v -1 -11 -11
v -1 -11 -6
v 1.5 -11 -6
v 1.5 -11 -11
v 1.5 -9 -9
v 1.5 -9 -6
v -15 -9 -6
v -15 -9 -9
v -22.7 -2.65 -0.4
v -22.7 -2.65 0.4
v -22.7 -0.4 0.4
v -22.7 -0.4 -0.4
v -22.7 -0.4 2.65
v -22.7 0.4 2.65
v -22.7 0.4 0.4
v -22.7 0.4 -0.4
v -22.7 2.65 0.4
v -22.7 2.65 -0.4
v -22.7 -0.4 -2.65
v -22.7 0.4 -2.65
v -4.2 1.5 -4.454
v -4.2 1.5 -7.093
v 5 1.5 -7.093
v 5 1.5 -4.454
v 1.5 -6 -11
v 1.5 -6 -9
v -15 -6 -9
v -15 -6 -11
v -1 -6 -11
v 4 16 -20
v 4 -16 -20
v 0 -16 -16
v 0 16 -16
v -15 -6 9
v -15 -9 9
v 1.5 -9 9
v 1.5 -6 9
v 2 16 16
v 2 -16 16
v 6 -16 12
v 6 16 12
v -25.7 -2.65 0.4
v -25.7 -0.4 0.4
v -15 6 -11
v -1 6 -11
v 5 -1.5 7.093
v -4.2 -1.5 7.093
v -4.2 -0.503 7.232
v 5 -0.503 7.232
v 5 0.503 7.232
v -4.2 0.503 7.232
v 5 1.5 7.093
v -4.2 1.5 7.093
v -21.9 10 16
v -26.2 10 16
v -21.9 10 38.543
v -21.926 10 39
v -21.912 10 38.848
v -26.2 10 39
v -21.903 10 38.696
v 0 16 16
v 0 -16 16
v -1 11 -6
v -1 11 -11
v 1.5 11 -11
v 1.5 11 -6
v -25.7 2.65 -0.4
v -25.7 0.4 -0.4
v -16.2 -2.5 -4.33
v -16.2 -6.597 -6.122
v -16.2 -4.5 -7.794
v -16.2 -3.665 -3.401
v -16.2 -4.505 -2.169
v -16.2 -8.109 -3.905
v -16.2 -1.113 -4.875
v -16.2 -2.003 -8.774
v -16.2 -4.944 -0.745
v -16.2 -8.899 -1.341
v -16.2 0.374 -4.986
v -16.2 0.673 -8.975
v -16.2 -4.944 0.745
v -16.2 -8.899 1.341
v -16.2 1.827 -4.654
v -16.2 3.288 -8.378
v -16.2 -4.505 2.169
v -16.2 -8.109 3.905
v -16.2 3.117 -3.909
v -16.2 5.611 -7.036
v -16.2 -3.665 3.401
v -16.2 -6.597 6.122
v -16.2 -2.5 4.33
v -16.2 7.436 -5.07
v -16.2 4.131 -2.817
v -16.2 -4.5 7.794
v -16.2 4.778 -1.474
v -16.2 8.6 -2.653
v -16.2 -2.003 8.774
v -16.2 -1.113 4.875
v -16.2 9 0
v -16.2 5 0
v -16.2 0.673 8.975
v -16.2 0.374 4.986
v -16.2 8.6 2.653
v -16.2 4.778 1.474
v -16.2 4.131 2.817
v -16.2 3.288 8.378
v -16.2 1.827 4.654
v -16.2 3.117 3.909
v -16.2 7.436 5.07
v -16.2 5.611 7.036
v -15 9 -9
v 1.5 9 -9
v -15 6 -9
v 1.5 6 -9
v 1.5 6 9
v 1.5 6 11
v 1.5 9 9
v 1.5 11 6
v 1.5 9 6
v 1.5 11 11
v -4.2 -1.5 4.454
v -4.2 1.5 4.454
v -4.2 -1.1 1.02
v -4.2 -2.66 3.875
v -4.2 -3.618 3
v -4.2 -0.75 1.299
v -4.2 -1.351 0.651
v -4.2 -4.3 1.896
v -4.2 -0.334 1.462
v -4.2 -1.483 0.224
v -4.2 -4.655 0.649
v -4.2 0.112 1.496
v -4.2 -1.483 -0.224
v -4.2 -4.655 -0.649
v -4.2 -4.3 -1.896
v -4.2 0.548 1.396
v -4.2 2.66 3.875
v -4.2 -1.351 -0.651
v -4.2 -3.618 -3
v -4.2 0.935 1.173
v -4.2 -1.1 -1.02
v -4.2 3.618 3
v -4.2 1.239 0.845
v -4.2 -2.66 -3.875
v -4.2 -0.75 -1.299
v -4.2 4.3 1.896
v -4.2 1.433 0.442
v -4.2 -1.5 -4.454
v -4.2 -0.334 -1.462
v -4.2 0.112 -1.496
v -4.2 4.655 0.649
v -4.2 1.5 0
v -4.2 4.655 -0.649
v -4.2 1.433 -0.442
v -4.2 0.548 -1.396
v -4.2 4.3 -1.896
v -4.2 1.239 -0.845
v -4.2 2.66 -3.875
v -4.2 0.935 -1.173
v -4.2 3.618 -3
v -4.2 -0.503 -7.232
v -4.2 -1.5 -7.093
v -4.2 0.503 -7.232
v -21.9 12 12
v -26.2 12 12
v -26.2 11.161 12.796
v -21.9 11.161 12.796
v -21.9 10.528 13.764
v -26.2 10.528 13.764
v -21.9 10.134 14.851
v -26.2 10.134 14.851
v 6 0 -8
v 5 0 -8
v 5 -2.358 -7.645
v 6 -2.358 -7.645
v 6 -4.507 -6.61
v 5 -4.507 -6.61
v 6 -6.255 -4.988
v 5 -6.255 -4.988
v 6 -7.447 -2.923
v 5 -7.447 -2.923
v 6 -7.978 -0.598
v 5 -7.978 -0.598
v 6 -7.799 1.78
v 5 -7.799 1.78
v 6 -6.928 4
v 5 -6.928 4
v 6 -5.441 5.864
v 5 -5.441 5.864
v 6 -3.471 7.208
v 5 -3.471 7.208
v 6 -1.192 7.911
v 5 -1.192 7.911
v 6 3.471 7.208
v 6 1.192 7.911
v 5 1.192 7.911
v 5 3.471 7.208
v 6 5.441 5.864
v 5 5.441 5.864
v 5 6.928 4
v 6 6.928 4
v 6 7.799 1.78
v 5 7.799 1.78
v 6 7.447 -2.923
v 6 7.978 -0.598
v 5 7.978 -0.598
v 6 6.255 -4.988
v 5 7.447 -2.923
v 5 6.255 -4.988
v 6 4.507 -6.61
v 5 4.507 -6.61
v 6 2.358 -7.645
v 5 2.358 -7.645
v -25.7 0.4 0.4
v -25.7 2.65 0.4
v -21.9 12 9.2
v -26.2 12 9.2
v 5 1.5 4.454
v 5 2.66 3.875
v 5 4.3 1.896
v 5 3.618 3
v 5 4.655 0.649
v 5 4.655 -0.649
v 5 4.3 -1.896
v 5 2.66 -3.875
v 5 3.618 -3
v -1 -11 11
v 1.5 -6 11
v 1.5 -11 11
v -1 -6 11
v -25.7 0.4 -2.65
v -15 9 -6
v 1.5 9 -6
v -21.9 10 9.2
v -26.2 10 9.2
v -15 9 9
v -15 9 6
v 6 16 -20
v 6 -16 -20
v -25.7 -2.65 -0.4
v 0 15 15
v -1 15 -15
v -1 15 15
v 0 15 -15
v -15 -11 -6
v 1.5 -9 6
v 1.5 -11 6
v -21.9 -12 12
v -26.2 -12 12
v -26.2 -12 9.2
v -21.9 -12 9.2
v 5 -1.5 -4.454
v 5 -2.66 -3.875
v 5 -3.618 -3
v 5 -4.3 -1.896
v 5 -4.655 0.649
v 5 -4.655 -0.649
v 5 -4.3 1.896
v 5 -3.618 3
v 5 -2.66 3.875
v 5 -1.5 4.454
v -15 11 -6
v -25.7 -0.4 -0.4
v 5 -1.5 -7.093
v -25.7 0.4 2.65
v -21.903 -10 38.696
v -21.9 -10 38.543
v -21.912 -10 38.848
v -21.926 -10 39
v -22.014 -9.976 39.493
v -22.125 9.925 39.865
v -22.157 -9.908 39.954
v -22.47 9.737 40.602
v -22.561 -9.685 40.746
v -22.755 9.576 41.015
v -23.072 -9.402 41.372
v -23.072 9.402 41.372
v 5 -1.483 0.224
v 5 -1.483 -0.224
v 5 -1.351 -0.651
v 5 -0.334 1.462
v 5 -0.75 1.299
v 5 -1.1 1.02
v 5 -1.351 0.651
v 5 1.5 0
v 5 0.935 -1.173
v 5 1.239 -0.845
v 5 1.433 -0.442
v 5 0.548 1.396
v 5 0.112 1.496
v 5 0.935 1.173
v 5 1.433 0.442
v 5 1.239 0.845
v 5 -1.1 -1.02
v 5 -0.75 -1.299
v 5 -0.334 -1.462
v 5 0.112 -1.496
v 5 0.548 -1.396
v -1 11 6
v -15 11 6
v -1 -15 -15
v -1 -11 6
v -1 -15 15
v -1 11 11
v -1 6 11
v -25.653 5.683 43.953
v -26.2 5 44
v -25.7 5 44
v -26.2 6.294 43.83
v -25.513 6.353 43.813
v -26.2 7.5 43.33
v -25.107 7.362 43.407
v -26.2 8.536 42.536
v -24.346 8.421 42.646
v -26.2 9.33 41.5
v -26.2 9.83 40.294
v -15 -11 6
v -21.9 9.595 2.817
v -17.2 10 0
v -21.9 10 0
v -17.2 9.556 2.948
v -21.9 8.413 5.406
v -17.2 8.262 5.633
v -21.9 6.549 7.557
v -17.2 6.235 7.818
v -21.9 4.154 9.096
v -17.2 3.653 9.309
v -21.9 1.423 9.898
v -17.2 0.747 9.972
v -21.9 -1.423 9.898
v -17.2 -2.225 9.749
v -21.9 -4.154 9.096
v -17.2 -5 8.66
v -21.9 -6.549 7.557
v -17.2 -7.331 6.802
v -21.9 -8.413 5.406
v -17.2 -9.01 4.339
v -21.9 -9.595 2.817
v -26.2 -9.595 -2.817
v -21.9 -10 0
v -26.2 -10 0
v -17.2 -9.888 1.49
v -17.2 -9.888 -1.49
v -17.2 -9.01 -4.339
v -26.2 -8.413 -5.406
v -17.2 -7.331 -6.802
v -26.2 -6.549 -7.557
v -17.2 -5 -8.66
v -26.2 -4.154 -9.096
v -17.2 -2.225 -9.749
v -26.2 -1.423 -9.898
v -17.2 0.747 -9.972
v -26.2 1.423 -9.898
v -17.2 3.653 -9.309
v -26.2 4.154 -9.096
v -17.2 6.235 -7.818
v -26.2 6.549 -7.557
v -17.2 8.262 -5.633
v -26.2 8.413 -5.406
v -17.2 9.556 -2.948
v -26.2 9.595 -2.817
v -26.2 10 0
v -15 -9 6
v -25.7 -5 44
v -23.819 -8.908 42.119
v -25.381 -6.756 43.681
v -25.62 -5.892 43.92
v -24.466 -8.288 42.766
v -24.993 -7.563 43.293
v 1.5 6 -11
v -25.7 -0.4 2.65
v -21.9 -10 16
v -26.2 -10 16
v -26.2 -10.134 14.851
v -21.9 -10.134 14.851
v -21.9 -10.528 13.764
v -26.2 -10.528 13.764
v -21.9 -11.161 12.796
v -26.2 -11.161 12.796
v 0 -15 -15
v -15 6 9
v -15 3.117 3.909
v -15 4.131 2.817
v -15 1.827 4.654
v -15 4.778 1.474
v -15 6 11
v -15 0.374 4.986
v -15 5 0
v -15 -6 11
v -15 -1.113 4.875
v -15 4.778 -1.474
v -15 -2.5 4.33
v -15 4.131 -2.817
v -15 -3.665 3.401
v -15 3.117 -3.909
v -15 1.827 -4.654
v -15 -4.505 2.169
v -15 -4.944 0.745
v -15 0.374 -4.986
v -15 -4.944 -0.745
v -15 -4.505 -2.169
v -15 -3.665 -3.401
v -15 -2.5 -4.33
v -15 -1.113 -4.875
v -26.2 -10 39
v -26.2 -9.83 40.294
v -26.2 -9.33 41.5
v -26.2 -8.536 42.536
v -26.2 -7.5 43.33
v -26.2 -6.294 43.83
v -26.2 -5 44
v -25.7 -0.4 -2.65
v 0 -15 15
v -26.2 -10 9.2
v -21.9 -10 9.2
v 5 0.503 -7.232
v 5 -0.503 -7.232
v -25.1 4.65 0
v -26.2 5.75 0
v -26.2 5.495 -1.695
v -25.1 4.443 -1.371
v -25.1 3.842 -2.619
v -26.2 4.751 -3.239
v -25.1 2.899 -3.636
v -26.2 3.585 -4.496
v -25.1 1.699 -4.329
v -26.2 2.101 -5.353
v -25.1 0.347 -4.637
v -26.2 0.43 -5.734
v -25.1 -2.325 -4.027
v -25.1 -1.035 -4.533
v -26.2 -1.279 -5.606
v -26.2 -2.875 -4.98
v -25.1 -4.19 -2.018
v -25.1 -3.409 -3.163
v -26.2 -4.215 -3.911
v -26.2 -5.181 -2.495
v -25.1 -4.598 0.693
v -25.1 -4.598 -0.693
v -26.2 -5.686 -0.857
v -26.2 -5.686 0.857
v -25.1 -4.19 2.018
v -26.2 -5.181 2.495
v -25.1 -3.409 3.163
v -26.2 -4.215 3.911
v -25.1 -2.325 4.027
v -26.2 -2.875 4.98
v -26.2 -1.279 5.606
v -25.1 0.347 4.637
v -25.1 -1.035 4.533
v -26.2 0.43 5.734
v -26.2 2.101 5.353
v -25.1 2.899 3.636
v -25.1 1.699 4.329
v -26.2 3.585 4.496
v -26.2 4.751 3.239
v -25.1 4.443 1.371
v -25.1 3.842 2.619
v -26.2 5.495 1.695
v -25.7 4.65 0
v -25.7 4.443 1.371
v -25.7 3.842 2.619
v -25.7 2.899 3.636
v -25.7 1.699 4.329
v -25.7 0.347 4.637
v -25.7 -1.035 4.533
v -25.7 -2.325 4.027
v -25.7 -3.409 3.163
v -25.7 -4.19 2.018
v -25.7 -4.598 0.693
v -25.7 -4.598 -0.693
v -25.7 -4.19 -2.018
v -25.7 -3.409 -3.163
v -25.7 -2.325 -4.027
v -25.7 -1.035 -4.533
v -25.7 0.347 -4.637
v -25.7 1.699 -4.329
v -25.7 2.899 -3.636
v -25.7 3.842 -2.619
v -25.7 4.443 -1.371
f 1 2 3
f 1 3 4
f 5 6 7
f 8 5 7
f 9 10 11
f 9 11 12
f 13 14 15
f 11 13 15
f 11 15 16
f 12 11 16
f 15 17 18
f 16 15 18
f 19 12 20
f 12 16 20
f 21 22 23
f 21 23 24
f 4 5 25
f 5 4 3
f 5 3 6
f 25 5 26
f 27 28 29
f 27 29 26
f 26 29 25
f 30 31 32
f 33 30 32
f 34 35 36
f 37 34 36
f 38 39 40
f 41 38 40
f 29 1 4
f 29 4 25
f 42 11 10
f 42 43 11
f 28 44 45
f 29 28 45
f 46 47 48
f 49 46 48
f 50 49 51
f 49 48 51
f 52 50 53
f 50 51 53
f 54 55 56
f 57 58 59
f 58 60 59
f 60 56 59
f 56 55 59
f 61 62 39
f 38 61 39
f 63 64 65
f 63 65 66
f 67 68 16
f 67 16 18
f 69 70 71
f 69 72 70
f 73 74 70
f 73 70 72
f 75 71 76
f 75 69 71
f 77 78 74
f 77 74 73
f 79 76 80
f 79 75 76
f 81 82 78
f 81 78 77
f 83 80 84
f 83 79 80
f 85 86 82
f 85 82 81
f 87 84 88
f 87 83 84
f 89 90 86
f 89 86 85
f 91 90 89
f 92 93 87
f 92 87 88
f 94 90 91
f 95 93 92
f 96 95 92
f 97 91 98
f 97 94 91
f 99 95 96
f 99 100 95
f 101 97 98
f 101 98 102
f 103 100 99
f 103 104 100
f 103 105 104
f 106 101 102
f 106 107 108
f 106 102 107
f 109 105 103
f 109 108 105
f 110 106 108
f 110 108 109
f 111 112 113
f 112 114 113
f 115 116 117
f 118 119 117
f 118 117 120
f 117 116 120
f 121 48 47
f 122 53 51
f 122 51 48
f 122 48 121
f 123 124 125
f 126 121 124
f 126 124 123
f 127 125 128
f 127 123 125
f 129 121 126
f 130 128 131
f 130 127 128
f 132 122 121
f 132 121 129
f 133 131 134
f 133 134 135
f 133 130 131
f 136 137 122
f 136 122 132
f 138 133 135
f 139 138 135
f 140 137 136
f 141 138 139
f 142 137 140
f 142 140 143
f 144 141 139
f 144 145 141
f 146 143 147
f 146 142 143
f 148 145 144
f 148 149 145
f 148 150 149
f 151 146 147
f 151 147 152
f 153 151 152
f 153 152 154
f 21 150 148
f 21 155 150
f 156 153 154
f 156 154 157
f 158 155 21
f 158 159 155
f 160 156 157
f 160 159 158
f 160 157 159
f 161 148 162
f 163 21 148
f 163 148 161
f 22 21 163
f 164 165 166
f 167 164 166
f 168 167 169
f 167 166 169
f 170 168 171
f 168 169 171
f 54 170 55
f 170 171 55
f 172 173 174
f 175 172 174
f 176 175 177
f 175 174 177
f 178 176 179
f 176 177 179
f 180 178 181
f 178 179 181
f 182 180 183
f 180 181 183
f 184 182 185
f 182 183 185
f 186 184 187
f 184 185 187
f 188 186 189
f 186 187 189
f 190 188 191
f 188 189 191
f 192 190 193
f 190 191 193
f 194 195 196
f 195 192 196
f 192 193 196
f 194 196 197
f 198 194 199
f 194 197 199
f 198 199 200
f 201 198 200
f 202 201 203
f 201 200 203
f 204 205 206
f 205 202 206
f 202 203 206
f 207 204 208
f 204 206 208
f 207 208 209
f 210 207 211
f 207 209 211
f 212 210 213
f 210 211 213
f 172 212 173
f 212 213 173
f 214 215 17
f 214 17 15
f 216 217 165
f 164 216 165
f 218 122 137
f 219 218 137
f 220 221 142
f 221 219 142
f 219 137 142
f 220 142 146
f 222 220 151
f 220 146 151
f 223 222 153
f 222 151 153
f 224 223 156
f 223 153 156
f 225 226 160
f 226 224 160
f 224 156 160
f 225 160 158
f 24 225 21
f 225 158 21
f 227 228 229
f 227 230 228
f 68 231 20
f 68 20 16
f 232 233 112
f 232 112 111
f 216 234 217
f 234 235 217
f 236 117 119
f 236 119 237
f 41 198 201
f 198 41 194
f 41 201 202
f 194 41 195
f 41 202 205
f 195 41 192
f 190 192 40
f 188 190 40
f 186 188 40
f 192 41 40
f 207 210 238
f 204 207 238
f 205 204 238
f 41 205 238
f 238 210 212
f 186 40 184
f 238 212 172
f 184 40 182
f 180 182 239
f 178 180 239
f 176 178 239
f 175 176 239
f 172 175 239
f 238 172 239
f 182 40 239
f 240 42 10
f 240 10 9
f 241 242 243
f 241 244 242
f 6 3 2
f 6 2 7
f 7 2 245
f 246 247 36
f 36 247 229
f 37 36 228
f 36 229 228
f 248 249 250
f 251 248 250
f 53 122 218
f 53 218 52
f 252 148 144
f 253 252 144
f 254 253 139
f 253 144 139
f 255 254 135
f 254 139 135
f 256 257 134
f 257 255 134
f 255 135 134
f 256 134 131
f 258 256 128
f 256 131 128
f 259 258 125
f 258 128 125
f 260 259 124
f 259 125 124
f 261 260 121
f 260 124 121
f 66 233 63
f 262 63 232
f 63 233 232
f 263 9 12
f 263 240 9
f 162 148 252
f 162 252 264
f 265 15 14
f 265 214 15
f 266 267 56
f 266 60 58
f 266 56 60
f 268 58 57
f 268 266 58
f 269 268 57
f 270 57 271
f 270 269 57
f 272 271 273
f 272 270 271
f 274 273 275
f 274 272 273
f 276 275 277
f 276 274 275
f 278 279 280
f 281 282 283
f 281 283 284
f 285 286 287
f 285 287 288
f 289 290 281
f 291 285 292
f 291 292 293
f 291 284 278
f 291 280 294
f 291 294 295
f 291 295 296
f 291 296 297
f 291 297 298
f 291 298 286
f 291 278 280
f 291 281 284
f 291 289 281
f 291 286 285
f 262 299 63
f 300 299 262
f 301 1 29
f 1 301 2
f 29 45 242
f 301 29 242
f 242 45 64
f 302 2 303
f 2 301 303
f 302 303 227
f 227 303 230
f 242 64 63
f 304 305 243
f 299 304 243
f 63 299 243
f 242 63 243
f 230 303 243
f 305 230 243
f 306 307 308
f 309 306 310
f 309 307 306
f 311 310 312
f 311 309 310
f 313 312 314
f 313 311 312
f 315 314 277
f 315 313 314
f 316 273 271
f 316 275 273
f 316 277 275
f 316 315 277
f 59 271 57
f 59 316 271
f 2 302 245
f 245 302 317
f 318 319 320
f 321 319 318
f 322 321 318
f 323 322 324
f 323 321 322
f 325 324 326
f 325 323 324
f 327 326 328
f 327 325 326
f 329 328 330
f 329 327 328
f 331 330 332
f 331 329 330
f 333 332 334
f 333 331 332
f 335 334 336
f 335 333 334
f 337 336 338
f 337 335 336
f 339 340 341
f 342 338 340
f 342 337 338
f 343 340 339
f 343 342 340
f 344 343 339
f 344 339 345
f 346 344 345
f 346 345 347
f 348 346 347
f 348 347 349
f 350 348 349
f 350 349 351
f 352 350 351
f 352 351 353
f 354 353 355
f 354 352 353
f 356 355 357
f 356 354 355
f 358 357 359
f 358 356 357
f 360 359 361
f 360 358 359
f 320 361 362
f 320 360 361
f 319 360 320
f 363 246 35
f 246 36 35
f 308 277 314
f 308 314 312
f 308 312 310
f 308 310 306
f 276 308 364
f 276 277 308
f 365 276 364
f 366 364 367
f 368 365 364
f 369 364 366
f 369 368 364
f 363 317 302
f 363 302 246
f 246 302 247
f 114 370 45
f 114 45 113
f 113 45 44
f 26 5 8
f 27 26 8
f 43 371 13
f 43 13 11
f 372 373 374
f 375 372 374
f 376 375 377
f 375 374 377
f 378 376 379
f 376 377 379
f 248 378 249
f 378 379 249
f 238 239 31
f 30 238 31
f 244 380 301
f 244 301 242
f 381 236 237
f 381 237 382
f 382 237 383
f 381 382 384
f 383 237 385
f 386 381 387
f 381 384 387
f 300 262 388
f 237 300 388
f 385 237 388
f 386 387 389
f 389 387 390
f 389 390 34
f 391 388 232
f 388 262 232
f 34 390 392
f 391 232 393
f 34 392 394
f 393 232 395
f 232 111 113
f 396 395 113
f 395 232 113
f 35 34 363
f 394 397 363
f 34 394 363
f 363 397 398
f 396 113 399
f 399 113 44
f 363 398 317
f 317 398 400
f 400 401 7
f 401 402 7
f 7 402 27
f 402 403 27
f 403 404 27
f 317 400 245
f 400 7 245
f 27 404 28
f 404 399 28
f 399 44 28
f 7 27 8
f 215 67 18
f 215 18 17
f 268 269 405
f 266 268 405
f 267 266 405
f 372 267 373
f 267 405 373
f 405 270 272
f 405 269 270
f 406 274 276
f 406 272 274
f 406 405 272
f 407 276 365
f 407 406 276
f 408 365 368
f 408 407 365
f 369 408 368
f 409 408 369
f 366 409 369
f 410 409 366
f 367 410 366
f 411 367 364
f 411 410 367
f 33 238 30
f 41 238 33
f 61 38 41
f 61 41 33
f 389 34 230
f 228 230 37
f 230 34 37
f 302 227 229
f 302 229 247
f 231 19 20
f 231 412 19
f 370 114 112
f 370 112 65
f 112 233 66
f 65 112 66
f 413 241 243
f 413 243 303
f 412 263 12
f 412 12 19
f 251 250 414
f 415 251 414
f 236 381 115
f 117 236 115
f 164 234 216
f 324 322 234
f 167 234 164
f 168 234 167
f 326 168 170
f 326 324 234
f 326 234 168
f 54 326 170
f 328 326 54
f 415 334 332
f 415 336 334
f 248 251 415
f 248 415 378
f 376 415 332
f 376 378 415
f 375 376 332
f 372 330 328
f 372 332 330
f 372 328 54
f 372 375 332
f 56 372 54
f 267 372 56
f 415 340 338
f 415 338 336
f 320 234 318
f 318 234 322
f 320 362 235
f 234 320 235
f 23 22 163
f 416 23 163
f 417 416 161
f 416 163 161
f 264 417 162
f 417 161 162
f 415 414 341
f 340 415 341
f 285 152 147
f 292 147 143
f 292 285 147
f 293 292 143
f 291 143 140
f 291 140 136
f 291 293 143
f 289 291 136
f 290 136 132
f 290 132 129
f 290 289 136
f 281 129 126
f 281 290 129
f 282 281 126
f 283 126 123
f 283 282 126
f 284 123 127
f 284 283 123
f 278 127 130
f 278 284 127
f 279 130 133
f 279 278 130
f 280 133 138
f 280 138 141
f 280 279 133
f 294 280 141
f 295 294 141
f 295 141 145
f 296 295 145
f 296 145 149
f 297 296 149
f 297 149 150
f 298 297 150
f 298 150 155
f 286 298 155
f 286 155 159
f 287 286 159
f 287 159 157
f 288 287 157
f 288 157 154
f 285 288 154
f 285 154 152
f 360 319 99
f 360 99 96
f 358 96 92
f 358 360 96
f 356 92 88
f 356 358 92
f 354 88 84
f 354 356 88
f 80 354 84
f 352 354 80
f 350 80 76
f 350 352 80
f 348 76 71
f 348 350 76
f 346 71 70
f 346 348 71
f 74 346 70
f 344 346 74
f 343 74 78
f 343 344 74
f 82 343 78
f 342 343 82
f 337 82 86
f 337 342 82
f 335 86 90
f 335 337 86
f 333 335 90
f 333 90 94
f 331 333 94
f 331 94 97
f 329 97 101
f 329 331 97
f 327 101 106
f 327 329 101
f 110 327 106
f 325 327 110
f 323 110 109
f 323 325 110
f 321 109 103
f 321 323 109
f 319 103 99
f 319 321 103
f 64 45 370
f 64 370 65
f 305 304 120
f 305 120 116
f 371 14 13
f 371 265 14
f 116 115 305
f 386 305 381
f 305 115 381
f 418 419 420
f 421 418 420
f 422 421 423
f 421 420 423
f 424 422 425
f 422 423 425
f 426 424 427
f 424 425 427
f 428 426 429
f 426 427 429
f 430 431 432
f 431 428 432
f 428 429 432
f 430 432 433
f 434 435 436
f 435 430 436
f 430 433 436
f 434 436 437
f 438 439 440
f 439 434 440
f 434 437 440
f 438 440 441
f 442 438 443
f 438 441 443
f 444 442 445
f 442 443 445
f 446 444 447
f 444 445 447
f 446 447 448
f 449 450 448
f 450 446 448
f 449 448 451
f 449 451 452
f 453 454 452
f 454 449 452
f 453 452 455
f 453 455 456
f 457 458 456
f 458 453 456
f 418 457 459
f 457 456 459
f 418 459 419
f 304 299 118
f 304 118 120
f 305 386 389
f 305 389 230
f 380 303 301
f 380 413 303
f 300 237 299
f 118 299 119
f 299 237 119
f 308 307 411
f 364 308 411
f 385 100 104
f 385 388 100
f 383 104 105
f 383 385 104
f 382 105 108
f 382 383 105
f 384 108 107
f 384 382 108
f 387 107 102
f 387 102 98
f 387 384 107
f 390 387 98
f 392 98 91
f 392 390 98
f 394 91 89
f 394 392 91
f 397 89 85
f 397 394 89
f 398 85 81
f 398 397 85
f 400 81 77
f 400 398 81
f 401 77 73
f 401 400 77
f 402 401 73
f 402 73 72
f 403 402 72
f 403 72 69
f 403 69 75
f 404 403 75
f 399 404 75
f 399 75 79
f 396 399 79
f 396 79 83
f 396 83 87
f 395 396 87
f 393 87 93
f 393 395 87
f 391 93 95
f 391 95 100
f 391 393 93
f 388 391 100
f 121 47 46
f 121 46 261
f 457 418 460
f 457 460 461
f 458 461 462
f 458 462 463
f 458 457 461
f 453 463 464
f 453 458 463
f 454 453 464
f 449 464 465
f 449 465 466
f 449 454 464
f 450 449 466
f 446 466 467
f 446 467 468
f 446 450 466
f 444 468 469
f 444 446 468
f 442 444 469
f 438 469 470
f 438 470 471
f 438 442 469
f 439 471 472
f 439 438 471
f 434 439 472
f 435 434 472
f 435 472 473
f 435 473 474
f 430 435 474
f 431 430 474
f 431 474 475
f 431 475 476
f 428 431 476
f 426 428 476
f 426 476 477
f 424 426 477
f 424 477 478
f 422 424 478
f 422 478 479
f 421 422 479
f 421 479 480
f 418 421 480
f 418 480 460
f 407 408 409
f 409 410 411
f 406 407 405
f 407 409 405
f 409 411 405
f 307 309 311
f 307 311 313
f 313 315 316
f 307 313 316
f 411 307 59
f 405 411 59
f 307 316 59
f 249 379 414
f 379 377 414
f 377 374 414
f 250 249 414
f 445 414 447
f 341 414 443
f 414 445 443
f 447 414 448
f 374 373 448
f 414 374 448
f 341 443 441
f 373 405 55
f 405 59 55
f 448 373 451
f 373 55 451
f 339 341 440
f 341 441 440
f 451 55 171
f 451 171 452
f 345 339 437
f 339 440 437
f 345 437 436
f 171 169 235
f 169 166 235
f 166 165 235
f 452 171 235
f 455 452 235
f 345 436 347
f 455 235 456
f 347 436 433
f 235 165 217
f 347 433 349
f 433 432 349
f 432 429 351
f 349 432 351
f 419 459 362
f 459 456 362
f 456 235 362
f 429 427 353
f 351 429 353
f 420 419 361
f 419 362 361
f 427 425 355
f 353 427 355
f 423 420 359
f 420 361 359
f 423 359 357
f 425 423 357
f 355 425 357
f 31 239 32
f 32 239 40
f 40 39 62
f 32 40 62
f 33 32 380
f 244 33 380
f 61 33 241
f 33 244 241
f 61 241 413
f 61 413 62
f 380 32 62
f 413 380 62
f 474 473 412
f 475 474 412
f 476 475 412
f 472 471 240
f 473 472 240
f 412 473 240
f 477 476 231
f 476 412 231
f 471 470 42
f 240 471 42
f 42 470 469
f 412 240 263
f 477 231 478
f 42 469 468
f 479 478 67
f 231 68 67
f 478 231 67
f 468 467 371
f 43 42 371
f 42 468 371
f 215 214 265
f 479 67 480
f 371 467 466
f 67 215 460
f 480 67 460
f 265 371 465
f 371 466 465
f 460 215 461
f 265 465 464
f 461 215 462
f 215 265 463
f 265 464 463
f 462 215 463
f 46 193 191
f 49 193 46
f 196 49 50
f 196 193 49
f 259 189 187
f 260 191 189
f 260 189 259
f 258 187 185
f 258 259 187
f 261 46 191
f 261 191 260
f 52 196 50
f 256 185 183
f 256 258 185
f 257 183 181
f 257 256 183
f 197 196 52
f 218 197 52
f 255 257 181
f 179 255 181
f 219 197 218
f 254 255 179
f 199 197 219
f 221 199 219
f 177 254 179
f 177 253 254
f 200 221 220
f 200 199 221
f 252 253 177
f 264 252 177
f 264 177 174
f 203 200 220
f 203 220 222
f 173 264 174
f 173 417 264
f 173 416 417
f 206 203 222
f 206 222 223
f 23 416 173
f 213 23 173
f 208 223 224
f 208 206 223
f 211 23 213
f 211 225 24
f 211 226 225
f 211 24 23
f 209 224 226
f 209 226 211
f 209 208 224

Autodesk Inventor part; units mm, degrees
sketch "Sketch_1" plane through (0, 0, 0) normal (0, 1, 0) x (-1, 0, 0)
  line L0 (0, 16) -> (-2, 16)
  line L1 (-2, 16) -> (-6, 12)
  line L2 (-6, 12) -> (-6, -20)
  line L3 (-6, -20) -> (-4, -20)
  line L4 (-4, -20) -> (0, -16)
  line L5 (0, -16) -> (0, 16)
extrude "Extrusion1" add sketch "Sketch_1" along normal mid plane 32
sketch "Sketch_2" plane through (0, 0, 0) normal (1, 0, 0) x (0, 1, 0)
  line L0 (15, 15) -> (-15, 15)
  line L1 (-15, 15) -> (-15, -15)
  line L2 (-15, -15) -> (15, -15)
  line L3 (15, -15) -> (15, 15)
extrude "Extrusion2" add sketch "Sketch_2" against normal blind 1
sketch "Sketch_3" plane through (0, 0, 0) normal (1, 0, 0) x (0, 1, 0)
  line L0 (11, 11) -> (-11, 11)
  line L1 (-11, 11) -> (-11, -11)
  line L2 (-11, -11) -> (11, -11)
  line L3 (11, -11) -> (11, 11)
extrude "Extrusion3" cut sketch "Sketch_3" along normal mid plane 3
sketch "Sketch_5" plane through (0, 0, 0) normal (0, 1, 0) x (-1, 0, 0)
  line L0 (15, -9) -> (15, 9)
  line L1 (15, 9) -> (-1.5, 9)
  line L2 (-1.5, 9) -> (-1.5, -9)
  line L3 (-1.5, -9) -> (15, -9)
extrude "Extrusion4" add sketch "Sketch_5" along normal mid plane 18
sketch "Sketch_4" plane through (0, 0, 0) normal (0, 1, 0) x (-1, 0, 0)
  line L0 (15, -6) -> (15, 6)
  line L1 (15, 6) -> (-1.5, 6)
  line L2 (-1.5, 6) -> (-1.5, -6)
  line L3 (-1.5, -6) -> (15, -6)
extrude "Extrusion5" add sketch "Sketch_4" along normal mid plane 22
sketch "Sketch_7" plane through (0, 0, 0) normal (0, 0, 1) x (1, 0, 0)
  line L0 (-15, 6) -> (-15, -6)
  line L1 (-15, -6) -> (1.5, -6)
  line L2 (1.5, -6) -> (1.5, 6)
  line L3 (1.5, 6) -> (-15, 6)
extrude "Extrusion6" add sketch "Sketch_7" along normal mid plane 22
sketch "Sketch_10" plane through (0, 0, 0) normal (0, 0, 1) x (1, 0, 0)
  line L0 (-15, 0) -> (-20.45, 0)
  line L1 (-20.45, 0) -> (-26.2, 5.75)
  line L2 (-26.2, 5.75) -> (-26.2, 10)
  line L3 (-26.2, 10) -> (-17.2, 10)
  line L4 (-17.2, 10) -> (-16.2, 9)
  line L5 (-16.2, 9) -> (-16.2, 5)
  line L6 (-16.2, 5) -> (-15, 5)
  line L7 (-15, 5) -> (-15, 0)
  line L8 (-15, 0) -> (-20.45, 0)
revolve "Revolution1" add sketch "Sketch_10" angle 360 about axis through (-15, 0, 0) along (1, 0, 0)
sketch "Sketch_11" plane through (0, 0, 0) normal (0, 0, 1) x (1, 0, 0)
  line L0 (-20.4, 0) -> (-26.2, 0)
  line L1 (-25.7, 0) -> (-25.7, 4.65)
  line L2 (-25.7, 4.65) -> (-25.05, 4.65)
  line L3 (-25.05, 4.65) -> (-20.4, 0)
  line L4 (-20.4, 0) -> (-25.7, 0)
revolve "Revolution2" add sketch "Sketch_11" angle 360 about axis through (-20.4, 0, 0) along (1, 0, 0)
sketch "Sketch_12" plane through (-25.7, 0, 0) normal (1, 0, 0) x (0, 0, -1)
  line L0 (-2.65, 0.4) -> (-2.65, -0.4)
  line L1 (-2.65, -0.4) -> (-0.4, -0.4)
  line L2 (-0.4, -0.4) -> (-0.4, -2.65)
  line L3 (-0.4, -2.65) -> (0.4, -2.65)
  line L4 (0.4, -2.65) -> (0.4, -0.4)
  line L5 (0.4, -0.4) -> (2.65, -0.4)
  line L6 (2.65, -0.4) -> (2.65, 0.4)
  line L7 (2.65, 0.4) -> (0.4, 0.4)
  line L8 (0.4, 0.4) -> (0.4, 2.65)
  line L9 (0.4, 2.65) -> (-0.4, 2.65)
  line L10 (-0.4, 2.65) -> (-0.4, 0.4)
  line L11 (-0.4, 0.4) -> (-2.65, 0.4)
extrude "Extrusion7" cut sketch "Sketch_12" along normal blind 3
sketch "Sketch_13" plane through (-26.2, 0, 0) normal (1, 0, 0) x (0, 0, -1)
  arc A0 (-44, -5) -> (-39, -10) centre (-39, -5) ccw
  line L0 (-39, -10) -> (-16, -10)
  arc A1 (-12, -12) -> (-16, -10) centre (-16, -15) ccw
  line L1 (-12, -12) -> (-9.2, -12)
  line L2 (-9.2, -12) -> (-9.2, -10)
  line L3 (-9.2, -10) -> (0, -10)
  line L4 (0, -10) -> (0, -6)
  arc A2 (0, 6) -> (0, -6) centre (0, 0) ccw
  line L5 (0, 6) -> (0, 10)
  line L6 (0, 10) -> (-9.2, 10)
  line L7 (-9.2, 10) -> (-9.2, 12)
  line L8 (-9.2, 12) -> (-12, 12)
  arc A3 (-16, 10) -> (-12, 12) centre (-16, 15) ccw
  line L9 (-16, 10) -> (-39, 10)
  arc A4 (-39, 10) -> (-44, 5) centre (-39, 5) ccw
  line L10 (-44, 5) -> (-44, -5)
extrude "Extrusion8" add sketch "Sketch_13" along normal blind 4.3
sketch "Sketch_14" plane through (0, 0, 0) normal (0, 1, 0) x (-1, 0, 0)
  line L0 (28, 34) -> (28, 49)
  line L1 (28, 49) -> (18, 49)
  line L2 (18, 49) -> (18, 34)
  line L3 (18, 34) -> (21.9, 34)
  line L4 (21.9, 34) -> (21.9, 38.5431)
  arc A0 (23.0716, 41.3716) -> (21.9, 38.5431) centre (25.9, 38.5431) ccw
  line L5 (23.0716, 41.3716) -> (25.7, 44)
  line L6 (25.7, 44) -> (26.2, 44)
  line L7 (26.2, 44) -> (26.2, 34)
  line L8 (26.2, 34) -> (28, 34)
extrude "Extrusion9" cut sketch "Sketch_14" along normal mid plane 20
sketch "Sketch_15" plane through (-4.2, 0, 0) normal (1, 0, 0) x (0, 0, -1)
  circle A0 centre (0, 0) radius 8
extrude "Extrusion10" cut sketch "Sketch_15" along normal blind 10.2
sketch "Sketch_16" plane through (-4.2, 0, 0) normal (1, 0, 0) x (0, 0, -1)
  circle A0 centre (0, 0) radius 8
  arc A1 (-7.0931, 1.5) -> (-7.0931, -1.5) centre (0, 0) ccw
  line L0 (-7.0931, -1.5) -> (-4.4542, -1.5)
  arc A2 (-4.4542, -1.5) -> (4.4542, -1.5) centre (0, 0) ccw
  line L1 (4.4542, -1.5) -> (7.0931, -1.5)
  arc A3 (7.0931, -1.5) -> (7.0931, 1.5) centre (0, 0) ccw
  line L2 (7.0931, 1.5) -> (4.4542, 1.5)
  arc A4 (4.4542, 1.5) -> (-4.4542, 1.5) centre (0, 0) ccw
  line L3 (-4.4542, 1.5) -> (-7.0931, 1.5)
extrude "Extrusion11" add sketch "Sketch_16" along normal blind 9.2
sketch "Sketch_17" plane through (0, 0, 0) normal (1, 0, 0) x (0, 1, 0)
  circle A0 centre (0, 0) radius 1.5
extrude "Extrusion12" add sketch "Sketch_17" along normal mid plane 10
ref_plane "verschluss_XY" through (-1, 0, 0) normal (1, 0, 0) x (0, 0, -1)
ref_plane "verschluss_YZ" through (-1, 0, 0) normal (0, 0, -1) x (0, 1, 0)
ref_plane "verschluss_ZX" through (-1, 0, 0) normal (0, 1, 0) x (1, 0, 0)
properties part number "1XXX_01_05_1"
